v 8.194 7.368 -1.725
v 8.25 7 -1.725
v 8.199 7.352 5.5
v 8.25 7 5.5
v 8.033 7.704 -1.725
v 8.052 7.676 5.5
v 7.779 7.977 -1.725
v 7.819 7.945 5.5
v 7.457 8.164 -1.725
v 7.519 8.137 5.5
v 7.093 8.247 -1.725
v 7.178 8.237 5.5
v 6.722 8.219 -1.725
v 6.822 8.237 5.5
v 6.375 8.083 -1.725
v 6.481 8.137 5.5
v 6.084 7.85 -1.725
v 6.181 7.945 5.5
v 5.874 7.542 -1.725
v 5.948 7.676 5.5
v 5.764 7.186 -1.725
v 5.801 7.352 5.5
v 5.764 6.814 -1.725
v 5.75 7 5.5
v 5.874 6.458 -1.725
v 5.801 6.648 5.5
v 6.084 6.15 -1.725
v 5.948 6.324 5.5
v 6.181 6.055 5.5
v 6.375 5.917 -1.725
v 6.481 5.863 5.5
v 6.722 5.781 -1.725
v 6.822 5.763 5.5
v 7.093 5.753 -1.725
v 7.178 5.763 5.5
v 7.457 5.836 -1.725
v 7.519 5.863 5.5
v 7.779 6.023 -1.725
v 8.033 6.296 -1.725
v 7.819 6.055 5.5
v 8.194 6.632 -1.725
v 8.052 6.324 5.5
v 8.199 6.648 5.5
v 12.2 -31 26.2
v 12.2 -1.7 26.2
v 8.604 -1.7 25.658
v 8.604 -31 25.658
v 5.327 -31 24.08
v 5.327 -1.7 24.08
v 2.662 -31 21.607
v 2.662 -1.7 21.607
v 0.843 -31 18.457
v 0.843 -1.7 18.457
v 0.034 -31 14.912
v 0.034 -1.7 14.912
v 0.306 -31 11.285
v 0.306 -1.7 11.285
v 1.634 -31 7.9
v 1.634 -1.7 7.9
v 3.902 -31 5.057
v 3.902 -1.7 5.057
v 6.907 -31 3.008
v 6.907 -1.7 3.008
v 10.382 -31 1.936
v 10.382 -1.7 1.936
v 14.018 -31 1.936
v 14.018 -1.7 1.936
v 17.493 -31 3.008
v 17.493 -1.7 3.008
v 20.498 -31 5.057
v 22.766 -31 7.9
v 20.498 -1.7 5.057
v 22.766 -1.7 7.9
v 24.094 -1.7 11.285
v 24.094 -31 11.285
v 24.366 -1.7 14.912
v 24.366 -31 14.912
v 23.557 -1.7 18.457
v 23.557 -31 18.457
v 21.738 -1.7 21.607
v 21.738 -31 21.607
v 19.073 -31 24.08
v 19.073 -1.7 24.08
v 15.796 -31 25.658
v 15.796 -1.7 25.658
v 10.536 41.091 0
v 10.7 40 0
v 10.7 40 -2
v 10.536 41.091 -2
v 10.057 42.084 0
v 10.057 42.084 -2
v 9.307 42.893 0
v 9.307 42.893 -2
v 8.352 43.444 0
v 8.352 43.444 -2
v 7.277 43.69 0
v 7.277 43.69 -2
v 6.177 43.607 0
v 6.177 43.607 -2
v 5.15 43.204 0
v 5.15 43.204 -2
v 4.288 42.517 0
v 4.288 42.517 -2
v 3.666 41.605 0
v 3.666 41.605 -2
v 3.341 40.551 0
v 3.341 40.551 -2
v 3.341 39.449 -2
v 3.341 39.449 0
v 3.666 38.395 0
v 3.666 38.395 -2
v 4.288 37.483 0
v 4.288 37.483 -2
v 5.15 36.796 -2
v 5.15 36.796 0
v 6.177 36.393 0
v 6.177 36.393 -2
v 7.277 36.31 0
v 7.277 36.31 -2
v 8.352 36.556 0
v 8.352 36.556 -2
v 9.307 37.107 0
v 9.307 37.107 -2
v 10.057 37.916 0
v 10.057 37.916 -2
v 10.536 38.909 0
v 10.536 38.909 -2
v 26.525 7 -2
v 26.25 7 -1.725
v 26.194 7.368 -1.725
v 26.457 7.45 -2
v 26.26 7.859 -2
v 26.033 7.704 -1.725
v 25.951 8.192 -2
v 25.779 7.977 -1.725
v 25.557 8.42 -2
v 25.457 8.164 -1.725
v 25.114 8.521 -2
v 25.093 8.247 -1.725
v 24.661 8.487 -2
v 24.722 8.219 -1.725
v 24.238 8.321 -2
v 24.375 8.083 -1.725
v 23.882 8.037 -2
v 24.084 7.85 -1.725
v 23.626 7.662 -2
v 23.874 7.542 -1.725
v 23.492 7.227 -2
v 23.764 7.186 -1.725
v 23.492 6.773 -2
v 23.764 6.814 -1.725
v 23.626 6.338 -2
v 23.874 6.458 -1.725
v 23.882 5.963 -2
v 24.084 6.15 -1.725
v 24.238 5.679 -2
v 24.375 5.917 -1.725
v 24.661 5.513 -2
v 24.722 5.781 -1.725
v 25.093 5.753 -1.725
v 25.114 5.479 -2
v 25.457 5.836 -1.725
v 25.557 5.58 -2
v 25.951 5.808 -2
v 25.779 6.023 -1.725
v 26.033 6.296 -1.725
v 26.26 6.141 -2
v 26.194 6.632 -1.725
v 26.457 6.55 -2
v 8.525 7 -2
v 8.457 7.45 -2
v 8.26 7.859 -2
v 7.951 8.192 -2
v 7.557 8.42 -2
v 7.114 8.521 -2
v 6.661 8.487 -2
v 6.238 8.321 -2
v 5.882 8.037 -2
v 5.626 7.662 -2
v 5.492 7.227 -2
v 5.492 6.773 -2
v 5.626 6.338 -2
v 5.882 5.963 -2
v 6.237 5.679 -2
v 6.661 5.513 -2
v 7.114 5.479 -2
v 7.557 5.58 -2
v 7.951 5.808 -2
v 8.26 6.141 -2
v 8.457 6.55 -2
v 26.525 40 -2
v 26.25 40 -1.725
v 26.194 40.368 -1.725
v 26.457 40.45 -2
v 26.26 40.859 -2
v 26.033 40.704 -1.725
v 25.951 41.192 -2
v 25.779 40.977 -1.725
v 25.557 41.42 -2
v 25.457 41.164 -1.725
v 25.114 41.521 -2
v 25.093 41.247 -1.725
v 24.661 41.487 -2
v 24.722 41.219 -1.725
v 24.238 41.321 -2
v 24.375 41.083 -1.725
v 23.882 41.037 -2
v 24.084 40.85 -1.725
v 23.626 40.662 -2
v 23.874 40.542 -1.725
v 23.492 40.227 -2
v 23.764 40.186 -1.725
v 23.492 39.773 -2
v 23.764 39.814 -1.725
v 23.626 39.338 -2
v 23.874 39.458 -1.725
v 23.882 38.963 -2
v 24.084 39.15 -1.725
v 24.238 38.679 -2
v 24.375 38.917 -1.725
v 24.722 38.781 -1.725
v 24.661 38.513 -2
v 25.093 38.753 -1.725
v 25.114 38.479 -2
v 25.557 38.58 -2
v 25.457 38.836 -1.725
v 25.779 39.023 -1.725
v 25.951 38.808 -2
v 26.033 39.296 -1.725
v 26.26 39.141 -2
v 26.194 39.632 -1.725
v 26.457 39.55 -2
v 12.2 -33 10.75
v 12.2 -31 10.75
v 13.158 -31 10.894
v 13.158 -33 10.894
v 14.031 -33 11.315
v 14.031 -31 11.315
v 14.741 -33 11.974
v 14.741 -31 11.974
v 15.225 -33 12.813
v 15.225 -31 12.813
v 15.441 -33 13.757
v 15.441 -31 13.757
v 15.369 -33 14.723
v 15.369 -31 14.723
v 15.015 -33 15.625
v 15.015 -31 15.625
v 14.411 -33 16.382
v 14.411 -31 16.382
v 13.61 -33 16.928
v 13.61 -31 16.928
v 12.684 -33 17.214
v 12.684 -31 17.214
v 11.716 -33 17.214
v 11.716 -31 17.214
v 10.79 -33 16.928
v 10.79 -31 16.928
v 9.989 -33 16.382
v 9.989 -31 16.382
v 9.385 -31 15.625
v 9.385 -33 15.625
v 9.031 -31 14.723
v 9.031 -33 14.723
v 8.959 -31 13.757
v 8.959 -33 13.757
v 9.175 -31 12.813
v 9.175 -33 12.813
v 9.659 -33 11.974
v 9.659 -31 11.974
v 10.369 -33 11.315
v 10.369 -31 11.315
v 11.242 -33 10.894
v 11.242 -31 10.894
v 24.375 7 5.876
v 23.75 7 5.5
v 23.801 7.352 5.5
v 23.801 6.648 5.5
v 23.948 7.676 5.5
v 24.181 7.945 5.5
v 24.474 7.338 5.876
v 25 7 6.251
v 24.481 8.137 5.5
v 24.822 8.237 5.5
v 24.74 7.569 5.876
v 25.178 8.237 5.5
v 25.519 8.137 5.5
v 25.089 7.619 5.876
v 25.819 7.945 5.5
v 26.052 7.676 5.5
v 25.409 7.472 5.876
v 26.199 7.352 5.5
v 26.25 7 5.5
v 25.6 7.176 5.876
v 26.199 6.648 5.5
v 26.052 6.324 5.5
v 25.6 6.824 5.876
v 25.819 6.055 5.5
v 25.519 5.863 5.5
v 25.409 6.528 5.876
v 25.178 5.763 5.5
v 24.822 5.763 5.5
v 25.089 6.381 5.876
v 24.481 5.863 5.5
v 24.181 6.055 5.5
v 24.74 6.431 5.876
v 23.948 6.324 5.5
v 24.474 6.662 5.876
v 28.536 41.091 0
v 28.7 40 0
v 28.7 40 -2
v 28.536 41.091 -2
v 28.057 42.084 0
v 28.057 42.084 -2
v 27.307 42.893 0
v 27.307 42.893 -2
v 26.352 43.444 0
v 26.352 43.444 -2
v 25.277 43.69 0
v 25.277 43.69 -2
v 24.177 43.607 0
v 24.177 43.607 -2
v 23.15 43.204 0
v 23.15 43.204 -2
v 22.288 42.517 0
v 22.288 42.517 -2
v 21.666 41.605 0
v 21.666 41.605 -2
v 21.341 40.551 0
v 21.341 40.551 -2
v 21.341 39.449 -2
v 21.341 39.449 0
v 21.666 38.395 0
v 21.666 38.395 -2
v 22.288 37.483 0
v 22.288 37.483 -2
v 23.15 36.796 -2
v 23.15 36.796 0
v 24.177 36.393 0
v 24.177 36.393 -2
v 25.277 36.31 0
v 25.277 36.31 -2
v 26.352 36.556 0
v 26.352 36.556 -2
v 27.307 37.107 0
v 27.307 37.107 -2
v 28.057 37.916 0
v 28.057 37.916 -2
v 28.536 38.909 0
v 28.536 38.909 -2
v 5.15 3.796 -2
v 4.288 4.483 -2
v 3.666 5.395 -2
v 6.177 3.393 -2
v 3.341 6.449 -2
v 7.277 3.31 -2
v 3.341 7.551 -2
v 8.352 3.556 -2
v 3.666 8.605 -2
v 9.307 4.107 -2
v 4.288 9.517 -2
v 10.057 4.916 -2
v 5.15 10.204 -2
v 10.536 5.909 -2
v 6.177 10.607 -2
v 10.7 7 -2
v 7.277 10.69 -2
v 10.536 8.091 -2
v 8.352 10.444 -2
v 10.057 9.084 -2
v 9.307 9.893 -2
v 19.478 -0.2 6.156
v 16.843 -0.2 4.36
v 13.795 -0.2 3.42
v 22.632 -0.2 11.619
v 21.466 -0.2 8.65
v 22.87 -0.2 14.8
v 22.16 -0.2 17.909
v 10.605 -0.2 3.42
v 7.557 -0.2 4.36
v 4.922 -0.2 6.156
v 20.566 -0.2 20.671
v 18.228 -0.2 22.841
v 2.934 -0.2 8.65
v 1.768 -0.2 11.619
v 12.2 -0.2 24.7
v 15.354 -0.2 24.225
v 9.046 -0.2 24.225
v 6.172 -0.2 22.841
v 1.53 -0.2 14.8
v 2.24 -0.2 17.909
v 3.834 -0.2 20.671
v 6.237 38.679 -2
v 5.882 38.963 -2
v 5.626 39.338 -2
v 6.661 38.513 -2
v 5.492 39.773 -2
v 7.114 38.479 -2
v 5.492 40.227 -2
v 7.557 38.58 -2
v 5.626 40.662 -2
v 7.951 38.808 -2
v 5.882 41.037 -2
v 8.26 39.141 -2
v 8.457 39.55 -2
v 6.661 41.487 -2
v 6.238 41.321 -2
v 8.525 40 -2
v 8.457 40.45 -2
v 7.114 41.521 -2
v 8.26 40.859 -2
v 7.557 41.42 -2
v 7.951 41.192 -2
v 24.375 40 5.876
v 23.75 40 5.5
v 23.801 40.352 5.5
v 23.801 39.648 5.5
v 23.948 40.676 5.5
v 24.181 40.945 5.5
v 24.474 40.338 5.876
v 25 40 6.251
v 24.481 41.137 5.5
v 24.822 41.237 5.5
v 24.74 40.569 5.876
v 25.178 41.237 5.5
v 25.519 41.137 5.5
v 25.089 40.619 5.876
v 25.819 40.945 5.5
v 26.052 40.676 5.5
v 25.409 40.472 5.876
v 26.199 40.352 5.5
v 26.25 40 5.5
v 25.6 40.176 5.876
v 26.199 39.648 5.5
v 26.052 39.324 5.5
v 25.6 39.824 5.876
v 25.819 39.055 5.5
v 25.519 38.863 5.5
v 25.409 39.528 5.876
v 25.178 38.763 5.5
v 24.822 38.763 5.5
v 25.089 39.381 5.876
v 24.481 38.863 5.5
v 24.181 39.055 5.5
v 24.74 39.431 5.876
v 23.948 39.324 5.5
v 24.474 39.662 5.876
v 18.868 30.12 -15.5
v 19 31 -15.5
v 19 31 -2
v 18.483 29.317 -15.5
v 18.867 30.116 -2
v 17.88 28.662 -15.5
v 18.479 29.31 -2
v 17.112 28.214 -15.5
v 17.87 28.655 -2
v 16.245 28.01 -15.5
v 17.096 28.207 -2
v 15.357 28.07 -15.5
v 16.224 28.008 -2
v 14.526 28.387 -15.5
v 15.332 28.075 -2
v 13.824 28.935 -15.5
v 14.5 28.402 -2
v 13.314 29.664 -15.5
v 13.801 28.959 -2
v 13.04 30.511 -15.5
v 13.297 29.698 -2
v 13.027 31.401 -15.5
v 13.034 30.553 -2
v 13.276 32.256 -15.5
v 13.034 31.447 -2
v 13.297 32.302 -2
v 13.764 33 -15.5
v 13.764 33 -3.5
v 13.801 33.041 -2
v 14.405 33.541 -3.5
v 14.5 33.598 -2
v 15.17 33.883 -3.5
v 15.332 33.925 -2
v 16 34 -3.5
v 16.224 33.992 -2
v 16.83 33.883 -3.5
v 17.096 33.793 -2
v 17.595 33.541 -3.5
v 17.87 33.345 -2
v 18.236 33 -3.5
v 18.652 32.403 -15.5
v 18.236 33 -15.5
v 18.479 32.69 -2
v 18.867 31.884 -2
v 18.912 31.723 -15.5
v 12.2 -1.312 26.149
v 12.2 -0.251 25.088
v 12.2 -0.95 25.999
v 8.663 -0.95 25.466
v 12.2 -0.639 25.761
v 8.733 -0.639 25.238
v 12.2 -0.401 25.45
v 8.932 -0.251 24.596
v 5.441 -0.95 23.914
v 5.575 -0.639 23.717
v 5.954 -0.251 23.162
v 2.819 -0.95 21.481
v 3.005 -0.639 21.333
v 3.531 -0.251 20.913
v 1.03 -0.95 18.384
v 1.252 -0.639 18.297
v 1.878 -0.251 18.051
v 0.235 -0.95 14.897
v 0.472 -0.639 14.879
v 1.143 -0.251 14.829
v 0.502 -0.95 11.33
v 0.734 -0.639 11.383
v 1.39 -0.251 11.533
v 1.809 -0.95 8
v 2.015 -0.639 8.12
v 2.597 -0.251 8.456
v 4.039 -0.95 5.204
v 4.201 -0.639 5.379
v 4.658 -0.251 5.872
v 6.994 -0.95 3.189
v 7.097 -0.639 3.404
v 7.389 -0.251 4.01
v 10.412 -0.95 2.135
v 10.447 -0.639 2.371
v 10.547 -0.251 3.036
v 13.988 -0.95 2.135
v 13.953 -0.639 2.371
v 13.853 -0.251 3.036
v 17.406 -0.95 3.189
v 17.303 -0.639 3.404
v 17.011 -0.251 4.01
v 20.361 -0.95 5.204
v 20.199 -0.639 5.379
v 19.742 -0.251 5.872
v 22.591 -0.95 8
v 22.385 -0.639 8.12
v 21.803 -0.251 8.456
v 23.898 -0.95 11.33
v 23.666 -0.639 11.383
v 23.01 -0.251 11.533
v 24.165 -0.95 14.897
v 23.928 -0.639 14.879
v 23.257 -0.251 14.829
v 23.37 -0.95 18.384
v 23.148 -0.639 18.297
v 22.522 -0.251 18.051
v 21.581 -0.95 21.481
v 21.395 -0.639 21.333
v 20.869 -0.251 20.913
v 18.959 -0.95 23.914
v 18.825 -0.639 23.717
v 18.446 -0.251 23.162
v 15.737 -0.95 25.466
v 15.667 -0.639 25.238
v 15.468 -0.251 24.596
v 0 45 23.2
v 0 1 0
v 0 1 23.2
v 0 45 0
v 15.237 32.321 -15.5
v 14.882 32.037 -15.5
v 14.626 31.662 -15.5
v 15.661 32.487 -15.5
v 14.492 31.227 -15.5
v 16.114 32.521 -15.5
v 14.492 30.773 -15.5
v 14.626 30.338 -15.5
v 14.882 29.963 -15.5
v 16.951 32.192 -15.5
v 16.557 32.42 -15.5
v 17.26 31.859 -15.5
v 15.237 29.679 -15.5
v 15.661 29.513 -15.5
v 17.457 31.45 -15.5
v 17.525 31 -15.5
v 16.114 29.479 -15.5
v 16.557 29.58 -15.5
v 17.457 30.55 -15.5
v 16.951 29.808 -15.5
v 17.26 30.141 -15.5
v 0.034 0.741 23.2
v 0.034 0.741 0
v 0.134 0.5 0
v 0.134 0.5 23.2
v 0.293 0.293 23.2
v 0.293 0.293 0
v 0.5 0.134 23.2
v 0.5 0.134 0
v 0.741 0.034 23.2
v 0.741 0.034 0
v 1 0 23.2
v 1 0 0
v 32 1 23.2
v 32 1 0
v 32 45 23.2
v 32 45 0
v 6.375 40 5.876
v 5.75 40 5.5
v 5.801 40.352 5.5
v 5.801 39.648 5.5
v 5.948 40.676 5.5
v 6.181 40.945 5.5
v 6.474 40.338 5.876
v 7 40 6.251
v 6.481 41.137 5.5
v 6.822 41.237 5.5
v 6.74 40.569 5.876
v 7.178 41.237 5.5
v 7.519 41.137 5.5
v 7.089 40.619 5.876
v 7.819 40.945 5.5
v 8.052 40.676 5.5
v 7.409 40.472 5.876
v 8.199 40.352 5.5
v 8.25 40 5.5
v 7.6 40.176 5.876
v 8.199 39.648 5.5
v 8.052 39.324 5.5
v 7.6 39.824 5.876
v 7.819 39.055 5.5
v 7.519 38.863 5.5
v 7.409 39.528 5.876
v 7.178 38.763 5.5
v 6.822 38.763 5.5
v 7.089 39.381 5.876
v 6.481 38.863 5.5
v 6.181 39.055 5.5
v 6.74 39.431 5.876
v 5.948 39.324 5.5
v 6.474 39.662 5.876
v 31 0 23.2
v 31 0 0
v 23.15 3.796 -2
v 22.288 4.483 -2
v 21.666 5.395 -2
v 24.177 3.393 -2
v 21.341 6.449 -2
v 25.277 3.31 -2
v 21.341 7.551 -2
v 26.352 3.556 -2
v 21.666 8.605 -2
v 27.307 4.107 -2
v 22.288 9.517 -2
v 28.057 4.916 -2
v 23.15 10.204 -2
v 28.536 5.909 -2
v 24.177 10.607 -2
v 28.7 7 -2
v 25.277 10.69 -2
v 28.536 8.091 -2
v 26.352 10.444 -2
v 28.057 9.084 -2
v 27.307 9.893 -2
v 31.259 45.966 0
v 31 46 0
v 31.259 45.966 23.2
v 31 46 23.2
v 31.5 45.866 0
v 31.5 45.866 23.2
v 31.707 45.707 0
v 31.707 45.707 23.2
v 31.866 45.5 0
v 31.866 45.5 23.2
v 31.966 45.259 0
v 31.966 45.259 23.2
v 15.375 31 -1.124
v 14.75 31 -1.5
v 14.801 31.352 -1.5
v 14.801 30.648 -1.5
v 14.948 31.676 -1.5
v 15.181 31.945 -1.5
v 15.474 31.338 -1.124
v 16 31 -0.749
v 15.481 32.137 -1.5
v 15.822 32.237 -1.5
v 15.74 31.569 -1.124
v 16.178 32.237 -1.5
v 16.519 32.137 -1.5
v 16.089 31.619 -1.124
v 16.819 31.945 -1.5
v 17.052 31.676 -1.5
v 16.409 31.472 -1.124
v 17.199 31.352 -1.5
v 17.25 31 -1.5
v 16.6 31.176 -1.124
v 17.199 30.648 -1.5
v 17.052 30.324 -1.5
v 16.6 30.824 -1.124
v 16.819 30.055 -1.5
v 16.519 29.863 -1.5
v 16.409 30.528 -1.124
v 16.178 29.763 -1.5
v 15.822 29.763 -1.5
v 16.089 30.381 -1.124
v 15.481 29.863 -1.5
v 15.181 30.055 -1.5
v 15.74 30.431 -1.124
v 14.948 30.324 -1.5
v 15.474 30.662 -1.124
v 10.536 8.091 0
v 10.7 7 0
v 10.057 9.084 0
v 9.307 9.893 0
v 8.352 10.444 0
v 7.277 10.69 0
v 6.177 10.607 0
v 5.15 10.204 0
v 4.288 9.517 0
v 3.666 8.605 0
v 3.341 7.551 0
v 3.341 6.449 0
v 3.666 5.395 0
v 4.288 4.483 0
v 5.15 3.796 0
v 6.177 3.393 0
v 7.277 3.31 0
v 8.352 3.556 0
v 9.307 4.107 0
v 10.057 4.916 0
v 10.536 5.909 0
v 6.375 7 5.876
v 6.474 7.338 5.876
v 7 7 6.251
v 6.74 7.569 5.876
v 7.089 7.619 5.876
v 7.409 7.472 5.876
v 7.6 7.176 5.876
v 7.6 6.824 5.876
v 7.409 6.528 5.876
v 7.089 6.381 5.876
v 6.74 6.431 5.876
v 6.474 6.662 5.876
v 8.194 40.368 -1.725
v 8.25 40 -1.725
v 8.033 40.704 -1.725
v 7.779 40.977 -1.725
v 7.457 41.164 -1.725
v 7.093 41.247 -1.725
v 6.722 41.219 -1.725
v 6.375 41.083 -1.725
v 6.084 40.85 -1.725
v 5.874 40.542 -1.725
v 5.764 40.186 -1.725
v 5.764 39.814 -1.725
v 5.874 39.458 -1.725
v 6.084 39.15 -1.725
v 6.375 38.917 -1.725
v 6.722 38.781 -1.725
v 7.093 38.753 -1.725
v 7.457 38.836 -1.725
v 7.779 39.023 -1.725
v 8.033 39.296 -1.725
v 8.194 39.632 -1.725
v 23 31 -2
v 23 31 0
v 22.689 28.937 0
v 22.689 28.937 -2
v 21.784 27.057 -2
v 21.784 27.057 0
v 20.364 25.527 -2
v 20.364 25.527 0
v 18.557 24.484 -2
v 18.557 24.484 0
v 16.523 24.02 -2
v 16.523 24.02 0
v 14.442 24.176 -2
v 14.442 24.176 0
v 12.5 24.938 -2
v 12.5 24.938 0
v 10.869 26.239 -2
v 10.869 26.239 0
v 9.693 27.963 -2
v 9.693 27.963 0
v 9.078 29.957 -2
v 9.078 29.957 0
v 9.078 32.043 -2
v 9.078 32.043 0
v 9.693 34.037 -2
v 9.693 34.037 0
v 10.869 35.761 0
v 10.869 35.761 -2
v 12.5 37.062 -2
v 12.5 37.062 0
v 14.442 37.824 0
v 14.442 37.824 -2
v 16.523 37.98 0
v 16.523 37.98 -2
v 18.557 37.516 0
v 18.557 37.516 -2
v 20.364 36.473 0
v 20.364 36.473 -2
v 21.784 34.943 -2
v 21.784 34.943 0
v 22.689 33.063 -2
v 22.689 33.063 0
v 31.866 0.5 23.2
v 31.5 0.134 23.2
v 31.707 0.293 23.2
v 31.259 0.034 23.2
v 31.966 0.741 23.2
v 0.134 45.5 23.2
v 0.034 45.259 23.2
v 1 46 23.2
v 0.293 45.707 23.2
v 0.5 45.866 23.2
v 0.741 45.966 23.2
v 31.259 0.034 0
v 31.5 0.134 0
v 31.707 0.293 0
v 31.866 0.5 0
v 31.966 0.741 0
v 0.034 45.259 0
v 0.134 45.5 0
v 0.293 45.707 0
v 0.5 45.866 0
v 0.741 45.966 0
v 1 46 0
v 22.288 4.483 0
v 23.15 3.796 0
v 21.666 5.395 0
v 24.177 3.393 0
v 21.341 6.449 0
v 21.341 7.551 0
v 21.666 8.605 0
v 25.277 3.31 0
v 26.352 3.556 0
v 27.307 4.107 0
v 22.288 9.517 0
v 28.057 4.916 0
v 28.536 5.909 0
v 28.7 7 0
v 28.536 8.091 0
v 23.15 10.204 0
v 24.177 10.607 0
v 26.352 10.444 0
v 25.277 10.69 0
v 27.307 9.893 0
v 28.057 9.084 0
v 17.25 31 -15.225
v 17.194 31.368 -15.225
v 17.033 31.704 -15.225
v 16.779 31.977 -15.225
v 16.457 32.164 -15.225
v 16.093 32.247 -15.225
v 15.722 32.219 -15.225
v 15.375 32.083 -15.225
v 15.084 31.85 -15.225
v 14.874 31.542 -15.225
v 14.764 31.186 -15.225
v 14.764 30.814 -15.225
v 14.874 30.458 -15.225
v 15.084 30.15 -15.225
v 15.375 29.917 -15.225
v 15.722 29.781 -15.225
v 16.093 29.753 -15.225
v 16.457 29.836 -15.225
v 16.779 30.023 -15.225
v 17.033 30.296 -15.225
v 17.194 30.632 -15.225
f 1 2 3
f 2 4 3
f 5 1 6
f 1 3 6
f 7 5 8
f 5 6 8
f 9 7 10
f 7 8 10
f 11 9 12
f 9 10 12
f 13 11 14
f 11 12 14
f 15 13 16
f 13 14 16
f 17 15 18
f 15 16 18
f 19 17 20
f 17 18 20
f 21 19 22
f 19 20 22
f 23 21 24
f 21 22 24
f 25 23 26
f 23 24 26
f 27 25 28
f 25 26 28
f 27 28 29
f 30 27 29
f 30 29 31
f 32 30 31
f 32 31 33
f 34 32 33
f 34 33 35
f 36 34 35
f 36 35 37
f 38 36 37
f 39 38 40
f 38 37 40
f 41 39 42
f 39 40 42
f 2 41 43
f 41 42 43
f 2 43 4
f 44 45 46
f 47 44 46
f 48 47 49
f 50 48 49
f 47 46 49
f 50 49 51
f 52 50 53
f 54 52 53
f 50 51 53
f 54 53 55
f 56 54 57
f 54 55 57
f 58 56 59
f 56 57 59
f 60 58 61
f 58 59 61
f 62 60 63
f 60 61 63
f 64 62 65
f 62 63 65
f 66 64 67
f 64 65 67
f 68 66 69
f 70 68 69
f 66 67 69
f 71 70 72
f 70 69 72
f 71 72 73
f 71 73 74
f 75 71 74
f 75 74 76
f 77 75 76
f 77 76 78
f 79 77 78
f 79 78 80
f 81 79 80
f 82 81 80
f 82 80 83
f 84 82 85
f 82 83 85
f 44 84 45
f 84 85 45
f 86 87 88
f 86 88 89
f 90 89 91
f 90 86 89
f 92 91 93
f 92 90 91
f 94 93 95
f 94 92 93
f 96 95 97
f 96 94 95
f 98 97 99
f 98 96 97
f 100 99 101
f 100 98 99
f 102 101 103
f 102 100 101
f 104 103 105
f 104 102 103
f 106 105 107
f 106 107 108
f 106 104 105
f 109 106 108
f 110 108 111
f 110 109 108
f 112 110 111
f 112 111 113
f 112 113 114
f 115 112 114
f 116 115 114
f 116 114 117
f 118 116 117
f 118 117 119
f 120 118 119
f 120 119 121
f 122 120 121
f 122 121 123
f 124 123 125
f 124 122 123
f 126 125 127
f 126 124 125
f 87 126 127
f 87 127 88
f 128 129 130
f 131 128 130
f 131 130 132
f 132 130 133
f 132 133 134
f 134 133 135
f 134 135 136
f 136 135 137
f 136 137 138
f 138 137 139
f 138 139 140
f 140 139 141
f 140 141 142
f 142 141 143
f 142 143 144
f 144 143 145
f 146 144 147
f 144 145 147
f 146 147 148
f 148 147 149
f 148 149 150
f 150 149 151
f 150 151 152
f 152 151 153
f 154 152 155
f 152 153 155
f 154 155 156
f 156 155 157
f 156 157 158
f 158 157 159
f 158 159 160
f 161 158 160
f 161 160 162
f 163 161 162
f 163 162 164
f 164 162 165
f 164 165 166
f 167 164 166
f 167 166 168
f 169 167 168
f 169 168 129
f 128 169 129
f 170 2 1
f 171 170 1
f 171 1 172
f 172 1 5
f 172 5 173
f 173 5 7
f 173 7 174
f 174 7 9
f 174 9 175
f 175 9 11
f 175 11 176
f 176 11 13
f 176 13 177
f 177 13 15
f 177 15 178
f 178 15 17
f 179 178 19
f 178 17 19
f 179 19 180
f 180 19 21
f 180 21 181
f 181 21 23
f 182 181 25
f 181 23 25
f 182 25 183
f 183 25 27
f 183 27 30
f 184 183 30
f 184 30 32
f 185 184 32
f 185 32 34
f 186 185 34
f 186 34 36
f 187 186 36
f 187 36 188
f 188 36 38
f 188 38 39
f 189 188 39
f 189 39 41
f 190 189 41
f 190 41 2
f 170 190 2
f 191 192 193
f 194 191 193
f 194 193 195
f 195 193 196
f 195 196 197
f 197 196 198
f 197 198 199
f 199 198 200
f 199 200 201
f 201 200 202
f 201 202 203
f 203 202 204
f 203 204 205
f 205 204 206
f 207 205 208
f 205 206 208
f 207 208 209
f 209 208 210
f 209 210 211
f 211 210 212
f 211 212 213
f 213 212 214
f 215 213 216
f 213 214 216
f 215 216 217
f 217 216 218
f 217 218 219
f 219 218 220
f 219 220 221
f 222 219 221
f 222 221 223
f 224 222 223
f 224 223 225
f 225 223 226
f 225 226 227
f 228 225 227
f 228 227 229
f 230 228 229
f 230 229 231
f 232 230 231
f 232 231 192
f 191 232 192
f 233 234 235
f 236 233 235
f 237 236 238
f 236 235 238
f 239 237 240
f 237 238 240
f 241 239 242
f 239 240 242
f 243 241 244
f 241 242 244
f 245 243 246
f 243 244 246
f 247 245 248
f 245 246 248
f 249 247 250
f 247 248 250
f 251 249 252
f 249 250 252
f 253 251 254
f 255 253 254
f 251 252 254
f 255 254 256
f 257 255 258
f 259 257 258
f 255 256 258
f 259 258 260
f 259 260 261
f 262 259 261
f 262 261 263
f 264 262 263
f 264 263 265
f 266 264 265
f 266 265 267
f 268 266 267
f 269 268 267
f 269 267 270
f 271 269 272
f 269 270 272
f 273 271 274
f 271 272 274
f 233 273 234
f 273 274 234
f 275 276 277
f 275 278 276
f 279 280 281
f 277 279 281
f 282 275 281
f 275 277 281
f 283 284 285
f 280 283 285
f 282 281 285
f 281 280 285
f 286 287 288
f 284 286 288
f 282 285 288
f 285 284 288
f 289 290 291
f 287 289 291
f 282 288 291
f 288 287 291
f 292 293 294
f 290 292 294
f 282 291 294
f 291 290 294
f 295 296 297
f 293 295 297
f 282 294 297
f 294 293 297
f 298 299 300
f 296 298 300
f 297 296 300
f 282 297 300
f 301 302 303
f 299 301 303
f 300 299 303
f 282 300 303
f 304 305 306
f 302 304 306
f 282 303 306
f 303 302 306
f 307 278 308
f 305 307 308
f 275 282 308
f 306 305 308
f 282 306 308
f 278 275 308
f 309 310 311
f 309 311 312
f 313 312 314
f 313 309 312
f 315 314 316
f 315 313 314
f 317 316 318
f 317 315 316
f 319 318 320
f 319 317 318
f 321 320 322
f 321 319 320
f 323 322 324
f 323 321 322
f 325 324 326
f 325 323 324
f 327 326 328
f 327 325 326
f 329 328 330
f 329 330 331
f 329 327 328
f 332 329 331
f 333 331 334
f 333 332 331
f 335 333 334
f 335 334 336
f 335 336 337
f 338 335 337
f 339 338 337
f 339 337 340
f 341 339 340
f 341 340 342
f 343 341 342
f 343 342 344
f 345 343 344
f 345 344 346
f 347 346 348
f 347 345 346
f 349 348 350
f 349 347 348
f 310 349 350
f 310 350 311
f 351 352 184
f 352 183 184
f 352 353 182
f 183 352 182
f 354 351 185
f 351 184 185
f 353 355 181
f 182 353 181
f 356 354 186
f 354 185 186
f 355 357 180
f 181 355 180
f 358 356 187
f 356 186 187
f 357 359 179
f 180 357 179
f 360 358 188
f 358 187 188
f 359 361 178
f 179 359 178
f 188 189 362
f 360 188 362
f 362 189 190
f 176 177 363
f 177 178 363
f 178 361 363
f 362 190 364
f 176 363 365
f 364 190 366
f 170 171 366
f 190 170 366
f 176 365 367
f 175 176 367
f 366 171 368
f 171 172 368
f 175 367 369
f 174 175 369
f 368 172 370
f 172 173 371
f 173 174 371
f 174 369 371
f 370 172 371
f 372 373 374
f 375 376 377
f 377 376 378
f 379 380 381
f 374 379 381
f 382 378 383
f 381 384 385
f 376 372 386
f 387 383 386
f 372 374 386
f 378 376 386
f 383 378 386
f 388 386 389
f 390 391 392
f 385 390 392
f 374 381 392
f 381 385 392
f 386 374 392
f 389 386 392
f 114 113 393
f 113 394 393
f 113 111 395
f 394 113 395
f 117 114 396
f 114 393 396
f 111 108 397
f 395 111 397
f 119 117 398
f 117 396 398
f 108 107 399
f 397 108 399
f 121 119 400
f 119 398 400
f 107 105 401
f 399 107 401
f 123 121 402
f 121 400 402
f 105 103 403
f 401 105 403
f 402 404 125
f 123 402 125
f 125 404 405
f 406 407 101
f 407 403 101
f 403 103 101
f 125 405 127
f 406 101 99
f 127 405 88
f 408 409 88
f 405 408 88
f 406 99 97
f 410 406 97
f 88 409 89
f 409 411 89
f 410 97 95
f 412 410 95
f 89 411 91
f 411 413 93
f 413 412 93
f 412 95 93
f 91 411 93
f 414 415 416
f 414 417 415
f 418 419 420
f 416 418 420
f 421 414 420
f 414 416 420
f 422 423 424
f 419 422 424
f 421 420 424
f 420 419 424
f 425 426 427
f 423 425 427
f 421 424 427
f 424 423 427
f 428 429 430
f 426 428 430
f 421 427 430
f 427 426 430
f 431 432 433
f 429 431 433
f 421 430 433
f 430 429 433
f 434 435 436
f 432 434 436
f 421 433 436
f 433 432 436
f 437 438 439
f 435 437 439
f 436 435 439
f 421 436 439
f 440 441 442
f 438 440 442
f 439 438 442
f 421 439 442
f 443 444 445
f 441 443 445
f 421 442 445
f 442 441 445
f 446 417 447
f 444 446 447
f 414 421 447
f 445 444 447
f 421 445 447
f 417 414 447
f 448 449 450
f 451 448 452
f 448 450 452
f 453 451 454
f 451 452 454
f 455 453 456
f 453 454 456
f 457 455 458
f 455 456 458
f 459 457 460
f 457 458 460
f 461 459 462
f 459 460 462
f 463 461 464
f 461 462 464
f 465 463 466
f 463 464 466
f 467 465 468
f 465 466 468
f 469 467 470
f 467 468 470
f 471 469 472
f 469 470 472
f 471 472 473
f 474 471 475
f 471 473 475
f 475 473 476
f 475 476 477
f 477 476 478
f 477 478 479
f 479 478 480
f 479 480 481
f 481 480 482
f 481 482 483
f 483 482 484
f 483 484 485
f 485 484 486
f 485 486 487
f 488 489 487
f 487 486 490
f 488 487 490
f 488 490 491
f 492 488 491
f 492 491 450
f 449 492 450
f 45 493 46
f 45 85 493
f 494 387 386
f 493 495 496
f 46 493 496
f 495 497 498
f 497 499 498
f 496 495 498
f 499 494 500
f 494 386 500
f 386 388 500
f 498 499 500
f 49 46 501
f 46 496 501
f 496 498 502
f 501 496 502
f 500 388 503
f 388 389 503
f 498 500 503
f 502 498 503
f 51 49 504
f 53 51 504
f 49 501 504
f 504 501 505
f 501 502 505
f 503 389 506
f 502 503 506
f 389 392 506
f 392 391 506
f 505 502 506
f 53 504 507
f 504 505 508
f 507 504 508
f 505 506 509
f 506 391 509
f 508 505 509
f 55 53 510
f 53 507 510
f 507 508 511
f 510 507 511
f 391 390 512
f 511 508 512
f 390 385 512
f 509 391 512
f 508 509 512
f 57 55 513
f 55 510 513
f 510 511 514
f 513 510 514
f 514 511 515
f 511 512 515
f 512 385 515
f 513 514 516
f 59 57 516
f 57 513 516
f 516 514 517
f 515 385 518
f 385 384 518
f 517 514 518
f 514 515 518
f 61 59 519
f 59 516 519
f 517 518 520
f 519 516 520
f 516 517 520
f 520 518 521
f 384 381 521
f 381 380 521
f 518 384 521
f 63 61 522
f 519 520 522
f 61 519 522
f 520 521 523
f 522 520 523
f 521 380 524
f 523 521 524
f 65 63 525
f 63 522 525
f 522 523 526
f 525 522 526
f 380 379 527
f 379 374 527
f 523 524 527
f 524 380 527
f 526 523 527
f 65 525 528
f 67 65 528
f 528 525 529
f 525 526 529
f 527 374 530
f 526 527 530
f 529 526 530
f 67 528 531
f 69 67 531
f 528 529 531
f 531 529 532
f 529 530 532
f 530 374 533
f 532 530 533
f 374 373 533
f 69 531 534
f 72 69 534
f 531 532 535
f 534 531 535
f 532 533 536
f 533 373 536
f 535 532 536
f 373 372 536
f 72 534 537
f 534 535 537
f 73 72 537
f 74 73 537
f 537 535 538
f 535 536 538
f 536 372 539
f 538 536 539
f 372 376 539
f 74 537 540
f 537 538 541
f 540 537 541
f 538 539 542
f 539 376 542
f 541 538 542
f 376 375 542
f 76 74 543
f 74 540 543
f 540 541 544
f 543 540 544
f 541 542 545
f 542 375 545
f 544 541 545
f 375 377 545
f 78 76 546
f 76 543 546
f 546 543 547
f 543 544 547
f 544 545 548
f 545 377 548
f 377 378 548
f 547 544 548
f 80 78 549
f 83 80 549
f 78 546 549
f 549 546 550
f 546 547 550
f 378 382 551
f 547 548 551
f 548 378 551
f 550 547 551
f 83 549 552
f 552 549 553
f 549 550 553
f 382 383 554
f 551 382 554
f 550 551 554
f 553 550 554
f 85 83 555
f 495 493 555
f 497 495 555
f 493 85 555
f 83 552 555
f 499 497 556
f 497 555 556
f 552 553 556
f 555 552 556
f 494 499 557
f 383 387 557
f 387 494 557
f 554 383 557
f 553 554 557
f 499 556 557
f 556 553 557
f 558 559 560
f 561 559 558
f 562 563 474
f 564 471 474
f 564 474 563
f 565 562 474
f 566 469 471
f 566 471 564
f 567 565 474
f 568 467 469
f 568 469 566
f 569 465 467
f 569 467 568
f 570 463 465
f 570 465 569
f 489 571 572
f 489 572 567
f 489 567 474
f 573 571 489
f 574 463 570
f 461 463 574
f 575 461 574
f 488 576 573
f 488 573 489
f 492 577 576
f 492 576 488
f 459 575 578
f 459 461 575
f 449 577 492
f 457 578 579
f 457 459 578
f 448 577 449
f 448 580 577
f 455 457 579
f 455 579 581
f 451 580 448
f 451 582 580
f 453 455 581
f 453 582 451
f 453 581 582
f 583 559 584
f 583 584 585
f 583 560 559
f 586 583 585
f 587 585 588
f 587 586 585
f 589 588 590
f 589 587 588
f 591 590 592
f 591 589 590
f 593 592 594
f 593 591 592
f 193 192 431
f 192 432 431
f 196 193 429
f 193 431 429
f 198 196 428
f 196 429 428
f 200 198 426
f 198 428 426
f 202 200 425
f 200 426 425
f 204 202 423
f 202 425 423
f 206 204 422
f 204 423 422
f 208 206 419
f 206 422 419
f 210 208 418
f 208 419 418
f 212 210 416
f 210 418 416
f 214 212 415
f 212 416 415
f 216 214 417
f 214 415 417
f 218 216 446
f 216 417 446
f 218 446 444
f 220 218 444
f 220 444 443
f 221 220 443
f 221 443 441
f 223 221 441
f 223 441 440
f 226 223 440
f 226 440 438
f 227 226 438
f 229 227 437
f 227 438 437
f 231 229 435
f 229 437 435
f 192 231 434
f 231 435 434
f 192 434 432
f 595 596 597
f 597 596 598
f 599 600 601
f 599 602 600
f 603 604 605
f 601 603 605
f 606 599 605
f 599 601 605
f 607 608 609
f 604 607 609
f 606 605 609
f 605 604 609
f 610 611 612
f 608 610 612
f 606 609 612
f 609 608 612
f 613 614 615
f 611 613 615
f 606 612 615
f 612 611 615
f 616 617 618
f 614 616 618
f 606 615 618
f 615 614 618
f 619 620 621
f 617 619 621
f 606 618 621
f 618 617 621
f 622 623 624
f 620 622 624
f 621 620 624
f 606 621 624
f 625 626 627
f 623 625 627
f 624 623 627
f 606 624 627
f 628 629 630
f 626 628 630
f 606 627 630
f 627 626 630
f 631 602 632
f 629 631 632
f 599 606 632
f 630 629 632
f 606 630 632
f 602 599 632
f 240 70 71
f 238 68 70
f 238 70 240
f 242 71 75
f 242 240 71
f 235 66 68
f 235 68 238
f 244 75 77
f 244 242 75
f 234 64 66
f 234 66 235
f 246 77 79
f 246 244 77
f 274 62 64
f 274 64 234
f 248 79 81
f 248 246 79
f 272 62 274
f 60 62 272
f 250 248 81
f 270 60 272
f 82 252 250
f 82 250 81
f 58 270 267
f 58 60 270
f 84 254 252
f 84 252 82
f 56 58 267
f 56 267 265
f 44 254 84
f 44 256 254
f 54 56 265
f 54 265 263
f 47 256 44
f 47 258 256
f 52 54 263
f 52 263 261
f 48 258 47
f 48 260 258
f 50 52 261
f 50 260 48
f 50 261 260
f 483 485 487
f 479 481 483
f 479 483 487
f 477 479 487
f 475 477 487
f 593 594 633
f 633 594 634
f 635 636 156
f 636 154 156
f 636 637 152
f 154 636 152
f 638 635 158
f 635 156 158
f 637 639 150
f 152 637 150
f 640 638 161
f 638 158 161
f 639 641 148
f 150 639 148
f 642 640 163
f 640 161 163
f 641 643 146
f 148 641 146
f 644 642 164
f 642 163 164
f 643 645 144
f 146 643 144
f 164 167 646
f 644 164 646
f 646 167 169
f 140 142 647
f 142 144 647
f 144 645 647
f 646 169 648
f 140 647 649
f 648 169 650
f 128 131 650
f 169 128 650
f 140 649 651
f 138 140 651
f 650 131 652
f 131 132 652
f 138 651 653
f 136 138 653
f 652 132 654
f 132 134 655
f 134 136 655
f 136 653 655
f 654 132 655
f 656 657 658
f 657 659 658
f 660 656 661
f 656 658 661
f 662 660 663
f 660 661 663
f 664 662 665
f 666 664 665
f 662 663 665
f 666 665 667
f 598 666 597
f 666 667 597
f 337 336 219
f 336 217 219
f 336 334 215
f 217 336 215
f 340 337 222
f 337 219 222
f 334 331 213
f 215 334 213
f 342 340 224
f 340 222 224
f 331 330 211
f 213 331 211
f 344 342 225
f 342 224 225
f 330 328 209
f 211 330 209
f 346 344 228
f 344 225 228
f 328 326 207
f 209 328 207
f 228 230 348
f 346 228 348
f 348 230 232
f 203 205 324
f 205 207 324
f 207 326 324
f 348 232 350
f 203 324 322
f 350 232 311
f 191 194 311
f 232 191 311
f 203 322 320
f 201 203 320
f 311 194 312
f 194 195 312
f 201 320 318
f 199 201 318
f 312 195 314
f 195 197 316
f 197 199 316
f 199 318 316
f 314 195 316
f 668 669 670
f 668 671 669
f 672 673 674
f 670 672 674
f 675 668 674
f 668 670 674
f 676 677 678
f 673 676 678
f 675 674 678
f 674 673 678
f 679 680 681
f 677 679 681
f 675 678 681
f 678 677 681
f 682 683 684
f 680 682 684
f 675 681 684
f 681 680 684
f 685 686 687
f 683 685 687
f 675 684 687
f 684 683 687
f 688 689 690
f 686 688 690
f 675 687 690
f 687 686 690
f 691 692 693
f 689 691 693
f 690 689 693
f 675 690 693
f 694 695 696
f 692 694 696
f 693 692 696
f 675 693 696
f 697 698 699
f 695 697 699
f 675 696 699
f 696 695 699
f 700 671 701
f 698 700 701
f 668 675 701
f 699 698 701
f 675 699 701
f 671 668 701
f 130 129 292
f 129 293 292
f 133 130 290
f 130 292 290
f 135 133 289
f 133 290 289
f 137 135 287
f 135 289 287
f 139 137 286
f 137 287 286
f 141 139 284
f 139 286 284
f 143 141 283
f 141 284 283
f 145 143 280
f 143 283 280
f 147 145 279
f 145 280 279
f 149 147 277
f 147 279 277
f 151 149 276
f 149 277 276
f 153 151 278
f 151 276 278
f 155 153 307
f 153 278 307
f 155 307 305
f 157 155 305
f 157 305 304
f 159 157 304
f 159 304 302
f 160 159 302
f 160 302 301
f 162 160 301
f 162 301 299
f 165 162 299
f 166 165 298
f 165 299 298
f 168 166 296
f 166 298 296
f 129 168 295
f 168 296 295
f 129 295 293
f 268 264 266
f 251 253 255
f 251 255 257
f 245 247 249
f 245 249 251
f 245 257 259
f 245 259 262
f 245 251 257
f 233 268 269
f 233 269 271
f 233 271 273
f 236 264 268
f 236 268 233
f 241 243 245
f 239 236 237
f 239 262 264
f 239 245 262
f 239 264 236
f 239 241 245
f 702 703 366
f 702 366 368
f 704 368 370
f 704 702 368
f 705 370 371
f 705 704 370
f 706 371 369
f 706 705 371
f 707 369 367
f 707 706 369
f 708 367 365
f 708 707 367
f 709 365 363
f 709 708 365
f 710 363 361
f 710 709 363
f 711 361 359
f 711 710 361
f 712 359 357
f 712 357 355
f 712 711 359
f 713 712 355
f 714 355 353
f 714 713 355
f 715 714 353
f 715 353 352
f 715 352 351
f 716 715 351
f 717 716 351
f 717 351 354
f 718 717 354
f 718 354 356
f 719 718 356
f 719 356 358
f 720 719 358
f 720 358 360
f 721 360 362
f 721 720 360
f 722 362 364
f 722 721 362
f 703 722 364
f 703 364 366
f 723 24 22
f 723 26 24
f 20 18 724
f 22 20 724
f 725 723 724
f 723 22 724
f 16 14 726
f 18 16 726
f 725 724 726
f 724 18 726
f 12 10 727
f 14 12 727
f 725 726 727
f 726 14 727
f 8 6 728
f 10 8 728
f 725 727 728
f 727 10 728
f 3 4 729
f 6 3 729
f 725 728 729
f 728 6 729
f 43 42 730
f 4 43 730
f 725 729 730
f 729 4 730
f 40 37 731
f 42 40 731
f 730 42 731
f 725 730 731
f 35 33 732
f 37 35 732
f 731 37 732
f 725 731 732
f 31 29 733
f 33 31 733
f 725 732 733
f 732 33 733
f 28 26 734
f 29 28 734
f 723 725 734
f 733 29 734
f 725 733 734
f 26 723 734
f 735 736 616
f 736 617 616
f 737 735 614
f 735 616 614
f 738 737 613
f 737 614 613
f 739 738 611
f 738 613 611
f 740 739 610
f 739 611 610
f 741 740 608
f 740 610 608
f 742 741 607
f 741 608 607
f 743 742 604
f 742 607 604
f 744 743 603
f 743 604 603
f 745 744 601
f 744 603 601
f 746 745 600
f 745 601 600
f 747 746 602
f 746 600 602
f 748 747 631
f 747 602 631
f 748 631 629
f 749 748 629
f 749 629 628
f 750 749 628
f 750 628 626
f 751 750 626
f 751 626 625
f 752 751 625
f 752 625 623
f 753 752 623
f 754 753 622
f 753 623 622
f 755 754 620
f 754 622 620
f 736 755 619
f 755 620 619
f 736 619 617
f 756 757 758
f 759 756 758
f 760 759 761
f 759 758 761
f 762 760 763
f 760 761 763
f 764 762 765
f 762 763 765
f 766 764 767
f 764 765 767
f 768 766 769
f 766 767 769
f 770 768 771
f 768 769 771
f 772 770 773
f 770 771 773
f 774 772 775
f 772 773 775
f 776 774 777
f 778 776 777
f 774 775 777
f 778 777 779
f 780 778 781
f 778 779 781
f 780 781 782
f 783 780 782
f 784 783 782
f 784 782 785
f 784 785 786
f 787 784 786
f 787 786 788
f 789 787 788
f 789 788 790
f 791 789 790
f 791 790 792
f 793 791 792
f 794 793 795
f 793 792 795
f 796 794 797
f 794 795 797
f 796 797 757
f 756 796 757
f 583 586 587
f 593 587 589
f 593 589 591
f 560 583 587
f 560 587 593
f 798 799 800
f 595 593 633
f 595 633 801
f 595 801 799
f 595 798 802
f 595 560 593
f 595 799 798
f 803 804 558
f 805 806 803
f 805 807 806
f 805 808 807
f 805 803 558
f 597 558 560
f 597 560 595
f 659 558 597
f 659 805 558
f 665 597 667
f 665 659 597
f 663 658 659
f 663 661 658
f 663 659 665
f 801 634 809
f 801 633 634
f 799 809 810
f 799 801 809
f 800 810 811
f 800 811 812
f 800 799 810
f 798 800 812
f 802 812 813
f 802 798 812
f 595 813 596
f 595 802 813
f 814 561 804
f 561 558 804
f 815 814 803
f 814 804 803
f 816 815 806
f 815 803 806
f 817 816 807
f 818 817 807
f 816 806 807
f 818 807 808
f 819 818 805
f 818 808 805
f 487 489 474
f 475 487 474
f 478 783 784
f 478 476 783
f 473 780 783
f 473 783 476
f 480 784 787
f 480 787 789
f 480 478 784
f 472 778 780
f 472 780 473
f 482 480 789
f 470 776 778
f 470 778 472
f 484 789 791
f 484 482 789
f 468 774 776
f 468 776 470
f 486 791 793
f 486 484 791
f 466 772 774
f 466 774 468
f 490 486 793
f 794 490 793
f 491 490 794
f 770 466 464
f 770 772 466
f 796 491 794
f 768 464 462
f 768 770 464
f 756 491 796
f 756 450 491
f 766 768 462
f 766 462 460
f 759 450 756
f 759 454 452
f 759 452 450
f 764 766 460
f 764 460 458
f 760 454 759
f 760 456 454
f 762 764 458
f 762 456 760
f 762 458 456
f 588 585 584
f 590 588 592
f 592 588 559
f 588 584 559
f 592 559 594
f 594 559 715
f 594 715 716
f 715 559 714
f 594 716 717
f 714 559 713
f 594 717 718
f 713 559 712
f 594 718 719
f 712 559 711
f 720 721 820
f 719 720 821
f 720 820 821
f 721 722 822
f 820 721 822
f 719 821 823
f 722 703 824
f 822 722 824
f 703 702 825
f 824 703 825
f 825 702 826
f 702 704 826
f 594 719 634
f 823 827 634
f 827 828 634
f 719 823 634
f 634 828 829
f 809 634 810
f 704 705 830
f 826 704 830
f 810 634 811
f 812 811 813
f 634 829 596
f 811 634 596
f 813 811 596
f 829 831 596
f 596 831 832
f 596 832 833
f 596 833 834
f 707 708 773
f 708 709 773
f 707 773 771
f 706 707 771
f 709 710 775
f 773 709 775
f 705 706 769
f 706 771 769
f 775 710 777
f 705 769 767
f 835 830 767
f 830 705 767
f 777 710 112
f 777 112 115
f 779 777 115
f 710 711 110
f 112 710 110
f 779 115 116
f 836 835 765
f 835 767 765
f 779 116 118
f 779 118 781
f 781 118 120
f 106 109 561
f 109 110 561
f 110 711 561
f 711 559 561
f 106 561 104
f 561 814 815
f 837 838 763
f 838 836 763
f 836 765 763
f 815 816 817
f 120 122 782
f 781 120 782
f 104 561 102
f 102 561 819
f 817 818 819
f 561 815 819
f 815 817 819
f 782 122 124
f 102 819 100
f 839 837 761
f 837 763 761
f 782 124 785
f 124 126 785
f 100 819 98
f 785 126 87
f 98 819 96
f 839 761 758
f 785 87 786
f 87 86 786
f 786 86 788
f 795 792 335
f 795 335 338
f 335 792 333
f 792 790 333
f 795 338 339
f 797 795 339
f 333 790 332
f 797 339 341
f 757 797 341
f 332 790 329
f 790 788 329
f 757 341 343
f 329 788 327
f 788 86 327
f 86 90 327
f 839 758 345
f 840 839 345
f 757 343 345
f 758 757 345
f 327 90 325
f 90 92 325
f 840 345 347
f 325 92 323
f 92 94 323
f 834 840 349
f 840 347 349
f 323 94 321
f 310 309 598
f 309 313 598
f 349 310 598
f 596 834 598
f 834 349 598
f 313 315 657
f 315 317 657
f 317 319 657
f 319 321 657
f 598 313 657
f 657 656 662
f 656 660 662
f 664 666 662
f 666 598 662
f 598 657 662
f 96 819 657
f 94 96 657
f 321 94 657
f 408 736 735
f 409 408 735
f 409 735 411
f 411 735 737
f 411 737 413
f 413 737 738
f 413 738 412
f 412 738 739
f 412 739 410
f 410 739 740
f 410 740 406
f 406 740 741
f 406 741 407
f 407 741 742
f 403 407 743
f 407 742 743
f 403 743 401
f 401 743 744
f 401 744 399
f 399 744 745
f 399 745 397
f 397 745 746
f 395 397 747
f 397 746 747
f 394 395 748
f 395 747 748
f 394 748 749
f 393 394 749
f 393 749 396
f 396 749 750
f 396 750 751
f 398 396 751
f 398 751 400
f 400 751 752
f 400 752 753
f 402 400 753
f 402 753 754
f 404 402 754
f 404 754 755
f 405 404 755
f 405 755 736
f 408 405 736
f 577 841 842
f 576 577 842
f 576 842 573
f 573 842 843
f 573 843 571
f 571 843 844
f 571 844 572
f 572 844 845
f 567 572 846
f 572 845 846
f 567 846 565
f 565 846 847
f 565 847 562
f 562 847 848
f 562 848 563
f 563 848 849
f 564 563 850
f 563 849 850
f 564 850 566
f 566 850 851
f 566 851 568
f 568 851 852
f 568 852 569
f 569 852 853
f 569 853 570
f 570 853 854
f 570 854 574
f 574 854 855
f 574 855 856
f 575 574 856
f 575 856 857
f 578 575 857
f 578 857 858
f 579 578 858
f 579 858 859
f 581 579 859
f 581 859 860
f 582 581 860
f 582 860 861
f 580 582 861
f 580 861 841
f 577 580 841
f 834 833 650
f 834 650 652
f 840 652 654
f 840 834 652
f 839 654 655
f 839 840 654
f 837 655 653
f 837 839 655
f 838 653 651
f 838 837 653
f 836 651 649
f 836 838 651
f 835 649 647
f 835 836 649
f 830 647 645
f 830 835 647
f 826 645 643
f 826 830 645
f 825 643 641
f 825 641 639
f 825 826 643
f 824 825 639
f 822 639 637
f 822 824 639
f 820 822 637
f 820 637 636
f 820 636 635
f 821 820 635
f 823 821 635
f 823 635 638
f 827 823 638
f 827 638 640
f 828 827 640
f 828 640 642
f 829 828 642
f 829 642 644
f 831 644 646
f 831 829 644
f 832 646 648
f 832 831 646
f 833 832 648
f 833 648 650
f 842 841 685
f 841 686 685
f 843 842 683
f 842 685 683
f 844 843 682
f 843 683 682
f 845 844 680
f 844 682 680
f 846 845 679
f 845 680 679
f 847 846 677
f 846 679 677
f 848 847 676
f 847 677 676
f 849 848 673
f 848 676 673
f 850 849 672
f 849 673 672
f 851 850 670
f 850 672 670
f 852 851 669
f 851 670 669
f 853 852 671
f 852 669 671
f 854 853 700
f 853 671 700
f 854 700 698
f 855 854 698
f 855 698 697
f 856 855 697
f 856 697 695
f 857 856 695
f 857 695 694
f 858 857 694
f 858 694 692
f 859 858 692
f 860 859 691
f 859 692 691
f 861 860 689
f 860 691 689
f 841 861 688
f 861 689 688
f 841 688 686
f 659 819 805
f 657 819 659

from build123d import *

# Parameters (mm, degrees)
SKETCH_1_W                   = 32
SKETCH_1_H                   = 46
EXTRUDE_1_DEPTH              = 23.2
SKETCH_1_3_R                 = 3.7
EXTRUDE_2_DEPTH              = 2
HOLE_WIZARD_M3_1_D           = 2.5
HOLE_WIZARD_M3_1_DEPTH       = 7.5
HOLE_WIZARD_M3_1_CSINK_D     = 3.05
HOLE_WIZARD_M3_1_CSINK_ANGLE = 90
HOLE_WIZARD_M3_1_TIP         = 0.751075774
SKETCH_4_R                   = 3
EXTRUDE_3_DEPTH              = 15.5
SKETCH_5_R                   = 7
EXTRUDE_4_DEPTH              = 2
HOLE_WIZARD_M3_2_D           = 2.5
HOLE_WIZARD_M3_2_DEPTH       = 14
HOLE_WIZARD_M3_2_CSINK_D     = 3.05
HOLE_WIZARD_M3_2_CSINK_ANGLE = 90
HOLE_WIZARD_M3_2_TIP         = 0.751075774
CUT_EXTRUDE_START            = -12
CUT_EXTRUDE_1_DEPTH          = 12
FILLET_1_R                   = 1
SKETCH_11_R                  = 12.2
EXTRUDE_6_DEPTH              = 30.8
FILLET_2_R                   = 1.5
SKETCH_12_R                  = 3.25
EXTRUDE_7_DEPTH              = 2


with BuildPart() as part:
    # 草图1 → 凸台-拉伸1 (new body)
    with BuildSketch(Plane.XY):
        with Locations((16, 23)):
            Rectangle(SKETCH_1_W, SKETCH_1_H)
    extrude(amount=EXTRUDE_1_DEPTH)

    # 草图1<3> → 凸台-拉伸2 (add)
    with BuildSketch(Plane.XY):
        with Locations((7, 40)):
            Circle(SKETCH_1_3_R)
        with Locations((25, 40)):
            Circle(SKETCH_1_3_R)
        with Locations((7, 7)):
            Circle(SKETCH_1_3_R)
        with Locations((25, 7)):
            Circle(SKETCH_1_3_R)
    extrude(amount=-EXTRUDE_2_DEPTH)

    # M3 螺纹孔1
    with Locations(Plane(origin=(0, 0, -2), x_dir=(-1, 0, 0), z_dir=(0, 0, -1))):
        with Locations((-7, 7), (-25, 7), (-25, 40), (-7, 40)):
            CounterSinkHole(HOLE_WIZARD_M3_1_D / 2, HOLE_WIZARD_M3_1_CSINK_D / 2, depth=HOLE_WIZARD_M3_1_DEPTH, counter_sink_angle=HOLE_WIZARD_M3_1_CSINK_ANGLE)
            with Locations((0, 0, -(HOLE_WIZARD_M3_1_DEPTH + HOLE_WIZARD_M3_1_TIP / 2))):  # 118° drill point
                Cone(0, HOLE_WIZARD_M3_1_D / 2, HOLE_WIZARD_M3_1_TIP, mode=Mode.SUBTRACT)

    # 草图4 → 凸台-拉伸3 (add)
    with BuildSketch(Plane(origin=(0, 0, 0), x_dir=(-1, 0, 0), z_dir=(0, 0, -1))):
        with Locations((-16, 31)):
            Circle(SKETCH_4_R)
    extrude(amount=EXTRUDE_3_DEPTH)

    # 草图5 → 凸台-拉伸4 (add)
    with BuildSketch(Plane(origin=(0, 0, 0), x_dir=(-1, 0, 0), z_dir=(0, 0, -1))):
        with Locations((-16, 31)):
            Circle(SKETCH_5_R)
    extrude(amount=EXTRUDE_4_DEPTH)

    # M3 螺纹孔2
    with Locations(Plane(origin=(0, 0, -15.5), x_dir=(-1, 0, 0), z_dir=(0, 0, -1))):
        with Locations((-16, 31)):
            CounterSinkHole(HOLE_WIZARD_M3_2_D / 2, HOLE_WIZARD_M3_2_CSINK_D / 2, depth=HOLE_WIZARD_M3_2_DEPTH, counter_sink_angle=HOLE_WIZARD_M3_2_CSINK_ANGLE)
            with Locations((0, 0, -(HOLE_WIZARD_M3_2_DEPTH + HOLE_WIZARD_M3_2_TIP / 2))):  # 118° drill point
                Cone(0, HOLE_WIZARD_M3_2_D / 2, HOLE_WIZARD_M3_2_TIP, mode=Mode.SUBTRACT)

    # 草图8 → 切除-拉伸1 (cut)
    with BuildSketch(Plane(origin=(0, 0, -15.5), x_dir=(-1, 0, 0), z_dir=(0, 0, -1)).offset(CUT_EXTRUDE_START)):
        with BuildLine():
            Line((-18.236067977, 33), (-13.763932023, 33))
            ThreePointArc((-13.763932023, 33), (-16, 34), (-18.236067977, 33))
        make_face()
    extrude(amount=CUT_EXTRUDE_1_DEPTH, mode=Mode.SUBTRACT)

    # 圆角1
    fillet_1_edges = [part.edges().sort_by_distance(p)[0] for p in [
        (0, 46, 11.6),
        (0, 0, 11.6),
        (32, 46, 11.6),
        (32, 0, 11.6),
    ]]
    fillet(fillet_1_edges, radius=FILLET_1_R)


with BuildPart() as body_2:
    # 草图11 → 凸台-拉伸6 (new body)
    with BuildSketch(Plane(origin=(0, -0.2, 0), x_dir=(-1, 0, 0), z_dir=(0, -1, 0))):
        with Locations((-12.2, -14)):
            Circle(SKETCH_11_R)
    extrude(amount=EXTRUDE_6_DEPTH)

    # 圆角2
    fillet_2_edges = [body_2.edges().sort_by_distance(p)[0] for p in [
        (24.4, -0.2, 14),
    ]]
    fillet(fillet_2_edges, radius=FILLET_2_R)

    # 草图12 → 凸台-拉伸7 (add)
    with BuildSketch(Plane.XZ.offset(31)):
        with Locations((12.2, 14)):
            Circle(SKETCH_12_R)
    extrude(amount=EXTRUDE_7_DEPTH)


solid = Compound([part.part, body_2.part])
